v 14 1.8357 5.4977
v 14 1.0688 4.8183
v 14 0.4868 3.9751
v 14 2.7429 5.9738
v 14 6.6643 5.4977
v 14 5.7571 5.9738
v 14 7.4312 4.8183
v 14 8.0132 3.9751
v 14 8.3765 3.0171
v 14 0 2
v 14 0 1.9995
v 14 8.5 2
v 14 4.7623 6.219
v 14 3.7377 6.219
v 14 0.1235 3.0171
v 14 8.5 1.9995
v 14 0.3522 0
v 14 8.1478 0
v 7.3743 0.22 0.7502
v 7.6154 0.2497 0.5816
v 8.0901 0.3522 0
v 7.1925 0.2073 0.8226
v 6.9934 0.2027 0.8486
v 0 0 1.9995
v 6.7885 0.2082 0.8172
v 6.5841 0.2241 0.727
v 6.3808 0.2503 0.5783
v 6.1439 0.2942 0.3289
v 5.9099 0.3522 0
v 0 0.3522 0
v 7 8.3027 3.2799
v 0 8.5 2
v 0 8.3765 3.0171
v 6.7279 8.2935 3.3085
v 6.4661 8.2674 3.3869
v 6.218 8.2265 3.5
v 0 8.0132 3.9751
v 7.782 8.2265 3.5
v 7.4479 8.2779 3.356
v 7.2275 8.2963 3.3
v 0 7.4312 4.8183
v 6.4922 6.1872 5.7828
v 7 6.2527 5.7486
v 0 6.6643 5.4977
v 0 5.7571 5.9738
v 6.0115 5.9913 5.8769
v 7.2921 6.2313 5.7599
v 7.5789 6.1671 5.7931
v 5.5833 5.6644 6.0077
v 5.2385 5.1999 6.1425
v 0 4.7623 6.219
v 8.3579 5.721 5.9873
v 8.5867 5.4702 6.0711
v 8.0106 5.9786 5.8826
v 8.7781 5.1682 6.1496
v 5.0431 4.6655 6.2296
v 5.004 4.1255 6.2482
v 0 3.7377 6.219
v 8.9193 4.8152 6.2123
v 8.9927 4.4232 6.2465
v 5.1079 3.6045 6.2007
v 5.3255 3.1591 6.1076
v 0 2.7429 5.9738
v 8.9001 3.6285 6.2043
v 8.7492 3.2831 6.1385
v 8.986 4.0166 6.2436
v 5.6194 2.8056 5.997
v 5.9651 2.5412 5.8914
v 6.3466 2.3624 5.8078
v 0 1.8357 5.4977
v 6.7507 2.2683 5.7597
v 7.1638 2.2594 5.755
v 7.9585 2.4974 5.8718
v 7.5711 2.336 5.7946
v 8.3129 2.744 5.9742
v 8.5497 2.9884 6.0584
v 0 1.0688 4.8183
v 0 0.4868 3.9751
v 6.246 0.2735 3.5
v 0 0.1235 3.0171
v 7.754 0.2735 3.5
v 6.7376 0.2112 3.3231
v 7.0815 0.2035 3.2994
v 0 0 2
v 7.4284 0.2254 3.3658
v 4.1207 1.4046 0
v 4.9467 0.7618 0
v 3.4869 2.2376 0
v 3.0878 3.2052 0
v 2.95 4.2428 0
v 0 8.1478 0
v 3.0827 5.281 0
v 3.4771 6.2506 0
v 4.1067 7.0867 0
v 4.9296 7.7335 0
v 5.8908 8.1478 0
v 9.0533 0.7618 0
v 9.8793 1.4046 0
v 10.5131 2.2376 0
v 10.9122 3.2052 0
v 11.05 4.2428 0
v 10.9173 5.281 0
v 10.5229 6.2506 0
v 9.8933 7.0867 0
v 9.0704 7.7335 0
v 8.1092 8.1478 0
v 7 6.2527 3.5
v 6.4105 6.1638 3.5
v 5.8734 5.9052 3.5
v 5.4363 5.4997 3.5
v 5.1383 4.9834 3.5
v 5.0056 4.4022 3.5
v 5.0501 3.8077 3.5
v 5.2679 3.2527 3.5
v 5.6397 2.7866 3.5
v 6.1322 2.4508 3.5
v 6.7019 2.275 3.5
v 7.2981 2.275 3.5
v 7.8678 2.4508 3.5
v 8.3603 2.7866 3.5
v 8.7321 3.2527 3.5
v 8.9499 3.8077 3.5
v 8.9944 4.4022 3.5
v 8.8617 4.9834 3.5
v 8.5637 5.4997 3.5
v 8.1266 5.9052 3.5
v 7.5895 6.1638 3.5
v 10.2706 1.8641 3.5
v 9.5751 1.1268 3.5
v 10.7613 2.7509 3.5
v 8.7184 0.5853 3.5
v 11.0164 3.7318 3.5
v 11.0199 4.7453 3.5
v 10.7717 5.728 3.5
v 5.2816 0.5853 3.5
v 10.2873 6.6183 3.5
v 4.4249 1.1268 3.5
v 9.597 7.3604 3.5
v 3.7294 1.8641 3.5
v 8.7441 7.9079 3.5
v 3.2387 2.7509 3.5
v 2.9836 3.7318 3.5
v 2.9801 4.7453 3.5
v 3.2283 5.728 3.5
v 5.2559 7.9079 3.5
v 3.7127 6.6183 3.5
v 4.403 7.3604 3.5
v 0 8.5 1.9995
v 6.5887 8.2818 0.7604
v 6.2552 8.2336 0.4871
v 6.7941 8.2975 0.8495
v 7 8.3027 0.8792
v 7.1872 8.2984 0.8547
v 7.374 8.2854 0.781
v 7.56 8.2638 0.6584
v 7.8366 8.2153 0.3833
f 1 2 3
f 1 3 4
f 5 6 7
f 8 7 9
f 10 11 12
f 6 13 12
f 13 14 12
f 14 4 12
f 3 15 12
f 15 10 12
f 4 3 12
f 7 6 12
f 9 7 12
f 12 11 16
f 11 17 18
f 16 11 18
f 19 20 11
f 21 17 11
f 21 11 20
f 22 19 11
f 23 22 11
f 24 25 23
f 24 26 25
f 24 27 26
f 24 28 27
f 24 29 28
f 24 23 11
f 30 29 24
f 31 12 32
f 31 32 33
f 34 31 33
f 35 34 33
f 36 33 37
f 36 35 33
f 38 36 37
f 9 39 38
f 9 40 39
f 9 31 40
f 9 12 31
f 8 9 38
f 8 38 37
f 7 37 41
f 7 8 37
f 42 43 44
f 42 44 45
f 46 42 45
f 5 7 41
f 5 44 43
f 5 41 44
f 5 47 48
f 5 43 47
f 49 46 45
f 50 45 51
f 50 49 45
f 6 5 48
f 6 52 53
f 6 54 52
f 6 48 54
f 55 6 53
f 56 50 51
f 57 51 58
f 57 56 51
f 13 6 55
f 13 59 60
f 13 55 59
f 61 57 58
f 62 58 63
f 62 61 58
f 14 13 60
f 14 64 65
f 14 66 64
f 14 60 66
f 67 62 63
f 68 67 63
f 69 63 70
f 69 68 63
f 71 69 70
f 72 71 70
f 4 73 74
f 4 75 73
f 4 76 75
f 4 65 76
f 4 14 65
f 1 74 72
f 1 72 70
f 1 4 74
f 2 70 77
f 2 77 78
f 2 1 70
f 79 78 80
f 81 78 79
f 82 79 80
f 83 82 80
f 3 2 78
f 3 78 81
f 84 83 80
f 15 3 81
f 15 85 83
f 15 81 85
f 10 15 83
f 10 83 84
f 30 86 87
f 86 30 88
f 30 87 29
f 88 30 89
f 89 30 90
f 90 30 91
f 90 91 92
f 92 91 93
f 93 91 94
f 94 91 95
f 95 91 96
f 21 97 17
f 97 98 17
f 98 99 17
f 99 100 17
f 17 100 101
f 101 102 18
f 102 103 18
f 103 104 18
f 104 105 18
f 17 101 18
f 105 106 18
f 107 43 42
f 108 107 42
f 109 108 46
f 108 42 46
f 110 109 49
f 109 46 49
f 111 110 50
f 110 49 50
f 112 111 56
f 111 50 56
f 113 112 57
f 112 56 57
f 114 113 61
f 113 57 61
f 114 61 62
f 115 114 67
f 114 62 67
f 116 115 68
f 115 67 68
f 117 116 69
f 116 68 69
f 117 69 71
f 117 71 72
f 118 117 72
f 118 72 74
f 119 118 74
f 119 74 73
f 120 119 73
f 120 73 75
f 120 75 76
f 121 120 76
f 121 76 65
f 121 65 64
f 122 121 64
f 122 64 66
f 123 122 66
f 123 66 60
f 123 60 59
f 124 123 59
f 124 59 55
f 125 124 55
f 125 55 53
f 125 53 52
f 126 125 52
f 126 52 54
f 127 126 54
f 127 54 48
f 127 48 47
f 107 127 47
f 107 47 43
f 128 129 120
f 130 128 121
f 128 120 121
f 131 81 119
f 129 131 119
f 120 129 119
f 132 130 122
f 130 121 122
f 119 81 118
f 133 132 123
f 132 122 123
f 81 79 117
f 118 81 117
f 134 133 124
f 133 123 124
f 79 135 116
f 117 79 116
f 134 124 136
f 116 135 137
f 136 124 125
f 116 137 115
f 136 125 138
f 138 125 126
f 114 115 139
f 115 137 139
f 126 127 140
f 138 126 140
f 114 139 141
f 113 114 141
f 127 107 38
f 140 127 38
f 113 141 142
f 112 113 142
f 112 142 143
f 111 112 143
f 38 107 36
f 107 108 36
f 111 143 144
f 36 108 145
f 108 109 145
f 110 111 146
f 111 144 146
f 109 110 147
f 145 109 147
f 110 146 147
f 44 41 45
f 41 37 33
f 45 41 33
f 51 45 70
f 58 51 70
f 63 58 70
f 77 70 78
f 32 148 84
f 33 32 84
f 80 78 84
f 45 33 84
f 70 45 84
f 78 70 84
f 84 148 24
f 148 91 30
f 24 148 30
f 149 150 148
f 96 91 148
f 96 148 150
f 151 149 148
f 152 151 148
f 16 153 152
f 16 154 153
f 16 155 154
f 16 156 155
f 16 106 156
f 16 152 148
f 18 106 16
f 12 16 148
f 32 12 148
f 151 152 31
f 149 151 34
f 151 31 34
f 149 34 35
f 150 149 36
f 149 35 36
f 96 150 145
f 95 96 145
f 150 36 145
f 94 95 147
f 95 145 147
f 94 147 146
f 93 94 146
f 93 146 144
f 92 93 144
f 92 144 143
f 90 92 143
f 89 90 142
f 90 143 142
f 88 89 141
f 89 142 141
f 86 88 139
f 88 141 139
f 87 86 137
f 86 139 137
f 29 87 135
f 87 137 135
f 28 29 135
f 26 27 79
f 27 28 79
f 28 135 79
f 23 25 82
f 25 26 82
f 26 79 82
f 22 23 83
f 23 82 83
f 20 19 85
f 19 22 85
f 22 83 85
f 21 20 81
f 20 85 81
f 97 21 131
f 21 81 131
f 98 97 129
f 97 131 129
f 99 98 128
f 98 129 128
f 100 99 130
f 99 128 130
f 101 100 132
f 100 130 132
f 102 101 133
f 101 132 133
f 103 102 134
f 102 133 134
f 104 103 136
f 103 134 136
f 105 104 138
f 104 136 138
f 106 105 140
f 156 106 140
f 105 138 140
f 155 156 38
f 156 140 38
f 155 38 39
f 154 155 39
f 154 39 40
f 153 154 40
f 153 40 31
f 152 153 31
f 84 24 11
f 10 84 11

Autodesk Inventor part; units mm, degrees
ref_plane "YZ Plane" through (0, 0, 0) normal (1, 0, 0) x (0, 1, 0)
ref_plane "XZ Plane" through (0, 0, 0) normal (0, 1, 0) x (-1, 0, 0)
ref_plane "XY Plane" through (0, 0, 0) normal (0, 0, 1) x (1, 0, 0)
sketch "Sketch1" plane through (0, 0, 0) normal (0, 0, 1) x (1, 0, 0)
  line L0 (0, 0) -> (14, 0)
  line L1 (14, 0) -> (14, 8.5)
  line L2 (14, 8.5) -> (0, 8.5)
  line L3 (0, 8.5) -> (0, 0)
  dimension "d0" = 14
  dimension "d1" = 8.5
extrude "Extrusion1" add sketch "Sketch1" along normal blind 2
sketch "Sketch2" plane through (14, 0, 0) normal (1, 0, 0) x (0, 0, -1)
  line L0 (-2, 8.5) -> (-2, 0) projected
  line L1 (0, 0) -> (-2, 0) projected
  line L2 (0, 8.5) -> (-2, 8.5) projected
  arc A0 (-2, 8.5) -> (-2, 0) centre (-2, 4.25) ccw
  line L3 (-2, 8.5) -> (-2, 0)
extrude "Extrusion2" add sketch "Sketch2" against normal blind 14
chamfer "Chamfer1" distance 2 angle 10 1 edges at (7, 0, 0) measured on face at (4.6667, 0, 0.6667)
chamfer "Chamfer2" distance 2 angle 10 1 edges at (7, 8.5, 0) measured on face at (9.3333, 8.5, 0.6667)
sketch "Sketch3" plane through (0, 0, 0) normal (0, 0, -1) x (-1, 0, 0)
  line L0 (-14, 8.1473) -> (0, 8.1473) projected
  line L1 (-14, 0.3527) -> (-14, 8.1473) projected
  line L2 (0, 0.3527) -> (-14, 0.3527) projected
  line L3 (0, 8.1473) -> (0, 0.3527) projected
  point P0 (0, 0)
hole "Hole1" at (7, 4.2527, 0) direction (0, 0, 1) diameter 4 end through all
hole "Hole2" at (7, 4.2527, 0) direction (0, 0, 1) diameter 8.1 depth 3.5
properties part number "cam pivot"
